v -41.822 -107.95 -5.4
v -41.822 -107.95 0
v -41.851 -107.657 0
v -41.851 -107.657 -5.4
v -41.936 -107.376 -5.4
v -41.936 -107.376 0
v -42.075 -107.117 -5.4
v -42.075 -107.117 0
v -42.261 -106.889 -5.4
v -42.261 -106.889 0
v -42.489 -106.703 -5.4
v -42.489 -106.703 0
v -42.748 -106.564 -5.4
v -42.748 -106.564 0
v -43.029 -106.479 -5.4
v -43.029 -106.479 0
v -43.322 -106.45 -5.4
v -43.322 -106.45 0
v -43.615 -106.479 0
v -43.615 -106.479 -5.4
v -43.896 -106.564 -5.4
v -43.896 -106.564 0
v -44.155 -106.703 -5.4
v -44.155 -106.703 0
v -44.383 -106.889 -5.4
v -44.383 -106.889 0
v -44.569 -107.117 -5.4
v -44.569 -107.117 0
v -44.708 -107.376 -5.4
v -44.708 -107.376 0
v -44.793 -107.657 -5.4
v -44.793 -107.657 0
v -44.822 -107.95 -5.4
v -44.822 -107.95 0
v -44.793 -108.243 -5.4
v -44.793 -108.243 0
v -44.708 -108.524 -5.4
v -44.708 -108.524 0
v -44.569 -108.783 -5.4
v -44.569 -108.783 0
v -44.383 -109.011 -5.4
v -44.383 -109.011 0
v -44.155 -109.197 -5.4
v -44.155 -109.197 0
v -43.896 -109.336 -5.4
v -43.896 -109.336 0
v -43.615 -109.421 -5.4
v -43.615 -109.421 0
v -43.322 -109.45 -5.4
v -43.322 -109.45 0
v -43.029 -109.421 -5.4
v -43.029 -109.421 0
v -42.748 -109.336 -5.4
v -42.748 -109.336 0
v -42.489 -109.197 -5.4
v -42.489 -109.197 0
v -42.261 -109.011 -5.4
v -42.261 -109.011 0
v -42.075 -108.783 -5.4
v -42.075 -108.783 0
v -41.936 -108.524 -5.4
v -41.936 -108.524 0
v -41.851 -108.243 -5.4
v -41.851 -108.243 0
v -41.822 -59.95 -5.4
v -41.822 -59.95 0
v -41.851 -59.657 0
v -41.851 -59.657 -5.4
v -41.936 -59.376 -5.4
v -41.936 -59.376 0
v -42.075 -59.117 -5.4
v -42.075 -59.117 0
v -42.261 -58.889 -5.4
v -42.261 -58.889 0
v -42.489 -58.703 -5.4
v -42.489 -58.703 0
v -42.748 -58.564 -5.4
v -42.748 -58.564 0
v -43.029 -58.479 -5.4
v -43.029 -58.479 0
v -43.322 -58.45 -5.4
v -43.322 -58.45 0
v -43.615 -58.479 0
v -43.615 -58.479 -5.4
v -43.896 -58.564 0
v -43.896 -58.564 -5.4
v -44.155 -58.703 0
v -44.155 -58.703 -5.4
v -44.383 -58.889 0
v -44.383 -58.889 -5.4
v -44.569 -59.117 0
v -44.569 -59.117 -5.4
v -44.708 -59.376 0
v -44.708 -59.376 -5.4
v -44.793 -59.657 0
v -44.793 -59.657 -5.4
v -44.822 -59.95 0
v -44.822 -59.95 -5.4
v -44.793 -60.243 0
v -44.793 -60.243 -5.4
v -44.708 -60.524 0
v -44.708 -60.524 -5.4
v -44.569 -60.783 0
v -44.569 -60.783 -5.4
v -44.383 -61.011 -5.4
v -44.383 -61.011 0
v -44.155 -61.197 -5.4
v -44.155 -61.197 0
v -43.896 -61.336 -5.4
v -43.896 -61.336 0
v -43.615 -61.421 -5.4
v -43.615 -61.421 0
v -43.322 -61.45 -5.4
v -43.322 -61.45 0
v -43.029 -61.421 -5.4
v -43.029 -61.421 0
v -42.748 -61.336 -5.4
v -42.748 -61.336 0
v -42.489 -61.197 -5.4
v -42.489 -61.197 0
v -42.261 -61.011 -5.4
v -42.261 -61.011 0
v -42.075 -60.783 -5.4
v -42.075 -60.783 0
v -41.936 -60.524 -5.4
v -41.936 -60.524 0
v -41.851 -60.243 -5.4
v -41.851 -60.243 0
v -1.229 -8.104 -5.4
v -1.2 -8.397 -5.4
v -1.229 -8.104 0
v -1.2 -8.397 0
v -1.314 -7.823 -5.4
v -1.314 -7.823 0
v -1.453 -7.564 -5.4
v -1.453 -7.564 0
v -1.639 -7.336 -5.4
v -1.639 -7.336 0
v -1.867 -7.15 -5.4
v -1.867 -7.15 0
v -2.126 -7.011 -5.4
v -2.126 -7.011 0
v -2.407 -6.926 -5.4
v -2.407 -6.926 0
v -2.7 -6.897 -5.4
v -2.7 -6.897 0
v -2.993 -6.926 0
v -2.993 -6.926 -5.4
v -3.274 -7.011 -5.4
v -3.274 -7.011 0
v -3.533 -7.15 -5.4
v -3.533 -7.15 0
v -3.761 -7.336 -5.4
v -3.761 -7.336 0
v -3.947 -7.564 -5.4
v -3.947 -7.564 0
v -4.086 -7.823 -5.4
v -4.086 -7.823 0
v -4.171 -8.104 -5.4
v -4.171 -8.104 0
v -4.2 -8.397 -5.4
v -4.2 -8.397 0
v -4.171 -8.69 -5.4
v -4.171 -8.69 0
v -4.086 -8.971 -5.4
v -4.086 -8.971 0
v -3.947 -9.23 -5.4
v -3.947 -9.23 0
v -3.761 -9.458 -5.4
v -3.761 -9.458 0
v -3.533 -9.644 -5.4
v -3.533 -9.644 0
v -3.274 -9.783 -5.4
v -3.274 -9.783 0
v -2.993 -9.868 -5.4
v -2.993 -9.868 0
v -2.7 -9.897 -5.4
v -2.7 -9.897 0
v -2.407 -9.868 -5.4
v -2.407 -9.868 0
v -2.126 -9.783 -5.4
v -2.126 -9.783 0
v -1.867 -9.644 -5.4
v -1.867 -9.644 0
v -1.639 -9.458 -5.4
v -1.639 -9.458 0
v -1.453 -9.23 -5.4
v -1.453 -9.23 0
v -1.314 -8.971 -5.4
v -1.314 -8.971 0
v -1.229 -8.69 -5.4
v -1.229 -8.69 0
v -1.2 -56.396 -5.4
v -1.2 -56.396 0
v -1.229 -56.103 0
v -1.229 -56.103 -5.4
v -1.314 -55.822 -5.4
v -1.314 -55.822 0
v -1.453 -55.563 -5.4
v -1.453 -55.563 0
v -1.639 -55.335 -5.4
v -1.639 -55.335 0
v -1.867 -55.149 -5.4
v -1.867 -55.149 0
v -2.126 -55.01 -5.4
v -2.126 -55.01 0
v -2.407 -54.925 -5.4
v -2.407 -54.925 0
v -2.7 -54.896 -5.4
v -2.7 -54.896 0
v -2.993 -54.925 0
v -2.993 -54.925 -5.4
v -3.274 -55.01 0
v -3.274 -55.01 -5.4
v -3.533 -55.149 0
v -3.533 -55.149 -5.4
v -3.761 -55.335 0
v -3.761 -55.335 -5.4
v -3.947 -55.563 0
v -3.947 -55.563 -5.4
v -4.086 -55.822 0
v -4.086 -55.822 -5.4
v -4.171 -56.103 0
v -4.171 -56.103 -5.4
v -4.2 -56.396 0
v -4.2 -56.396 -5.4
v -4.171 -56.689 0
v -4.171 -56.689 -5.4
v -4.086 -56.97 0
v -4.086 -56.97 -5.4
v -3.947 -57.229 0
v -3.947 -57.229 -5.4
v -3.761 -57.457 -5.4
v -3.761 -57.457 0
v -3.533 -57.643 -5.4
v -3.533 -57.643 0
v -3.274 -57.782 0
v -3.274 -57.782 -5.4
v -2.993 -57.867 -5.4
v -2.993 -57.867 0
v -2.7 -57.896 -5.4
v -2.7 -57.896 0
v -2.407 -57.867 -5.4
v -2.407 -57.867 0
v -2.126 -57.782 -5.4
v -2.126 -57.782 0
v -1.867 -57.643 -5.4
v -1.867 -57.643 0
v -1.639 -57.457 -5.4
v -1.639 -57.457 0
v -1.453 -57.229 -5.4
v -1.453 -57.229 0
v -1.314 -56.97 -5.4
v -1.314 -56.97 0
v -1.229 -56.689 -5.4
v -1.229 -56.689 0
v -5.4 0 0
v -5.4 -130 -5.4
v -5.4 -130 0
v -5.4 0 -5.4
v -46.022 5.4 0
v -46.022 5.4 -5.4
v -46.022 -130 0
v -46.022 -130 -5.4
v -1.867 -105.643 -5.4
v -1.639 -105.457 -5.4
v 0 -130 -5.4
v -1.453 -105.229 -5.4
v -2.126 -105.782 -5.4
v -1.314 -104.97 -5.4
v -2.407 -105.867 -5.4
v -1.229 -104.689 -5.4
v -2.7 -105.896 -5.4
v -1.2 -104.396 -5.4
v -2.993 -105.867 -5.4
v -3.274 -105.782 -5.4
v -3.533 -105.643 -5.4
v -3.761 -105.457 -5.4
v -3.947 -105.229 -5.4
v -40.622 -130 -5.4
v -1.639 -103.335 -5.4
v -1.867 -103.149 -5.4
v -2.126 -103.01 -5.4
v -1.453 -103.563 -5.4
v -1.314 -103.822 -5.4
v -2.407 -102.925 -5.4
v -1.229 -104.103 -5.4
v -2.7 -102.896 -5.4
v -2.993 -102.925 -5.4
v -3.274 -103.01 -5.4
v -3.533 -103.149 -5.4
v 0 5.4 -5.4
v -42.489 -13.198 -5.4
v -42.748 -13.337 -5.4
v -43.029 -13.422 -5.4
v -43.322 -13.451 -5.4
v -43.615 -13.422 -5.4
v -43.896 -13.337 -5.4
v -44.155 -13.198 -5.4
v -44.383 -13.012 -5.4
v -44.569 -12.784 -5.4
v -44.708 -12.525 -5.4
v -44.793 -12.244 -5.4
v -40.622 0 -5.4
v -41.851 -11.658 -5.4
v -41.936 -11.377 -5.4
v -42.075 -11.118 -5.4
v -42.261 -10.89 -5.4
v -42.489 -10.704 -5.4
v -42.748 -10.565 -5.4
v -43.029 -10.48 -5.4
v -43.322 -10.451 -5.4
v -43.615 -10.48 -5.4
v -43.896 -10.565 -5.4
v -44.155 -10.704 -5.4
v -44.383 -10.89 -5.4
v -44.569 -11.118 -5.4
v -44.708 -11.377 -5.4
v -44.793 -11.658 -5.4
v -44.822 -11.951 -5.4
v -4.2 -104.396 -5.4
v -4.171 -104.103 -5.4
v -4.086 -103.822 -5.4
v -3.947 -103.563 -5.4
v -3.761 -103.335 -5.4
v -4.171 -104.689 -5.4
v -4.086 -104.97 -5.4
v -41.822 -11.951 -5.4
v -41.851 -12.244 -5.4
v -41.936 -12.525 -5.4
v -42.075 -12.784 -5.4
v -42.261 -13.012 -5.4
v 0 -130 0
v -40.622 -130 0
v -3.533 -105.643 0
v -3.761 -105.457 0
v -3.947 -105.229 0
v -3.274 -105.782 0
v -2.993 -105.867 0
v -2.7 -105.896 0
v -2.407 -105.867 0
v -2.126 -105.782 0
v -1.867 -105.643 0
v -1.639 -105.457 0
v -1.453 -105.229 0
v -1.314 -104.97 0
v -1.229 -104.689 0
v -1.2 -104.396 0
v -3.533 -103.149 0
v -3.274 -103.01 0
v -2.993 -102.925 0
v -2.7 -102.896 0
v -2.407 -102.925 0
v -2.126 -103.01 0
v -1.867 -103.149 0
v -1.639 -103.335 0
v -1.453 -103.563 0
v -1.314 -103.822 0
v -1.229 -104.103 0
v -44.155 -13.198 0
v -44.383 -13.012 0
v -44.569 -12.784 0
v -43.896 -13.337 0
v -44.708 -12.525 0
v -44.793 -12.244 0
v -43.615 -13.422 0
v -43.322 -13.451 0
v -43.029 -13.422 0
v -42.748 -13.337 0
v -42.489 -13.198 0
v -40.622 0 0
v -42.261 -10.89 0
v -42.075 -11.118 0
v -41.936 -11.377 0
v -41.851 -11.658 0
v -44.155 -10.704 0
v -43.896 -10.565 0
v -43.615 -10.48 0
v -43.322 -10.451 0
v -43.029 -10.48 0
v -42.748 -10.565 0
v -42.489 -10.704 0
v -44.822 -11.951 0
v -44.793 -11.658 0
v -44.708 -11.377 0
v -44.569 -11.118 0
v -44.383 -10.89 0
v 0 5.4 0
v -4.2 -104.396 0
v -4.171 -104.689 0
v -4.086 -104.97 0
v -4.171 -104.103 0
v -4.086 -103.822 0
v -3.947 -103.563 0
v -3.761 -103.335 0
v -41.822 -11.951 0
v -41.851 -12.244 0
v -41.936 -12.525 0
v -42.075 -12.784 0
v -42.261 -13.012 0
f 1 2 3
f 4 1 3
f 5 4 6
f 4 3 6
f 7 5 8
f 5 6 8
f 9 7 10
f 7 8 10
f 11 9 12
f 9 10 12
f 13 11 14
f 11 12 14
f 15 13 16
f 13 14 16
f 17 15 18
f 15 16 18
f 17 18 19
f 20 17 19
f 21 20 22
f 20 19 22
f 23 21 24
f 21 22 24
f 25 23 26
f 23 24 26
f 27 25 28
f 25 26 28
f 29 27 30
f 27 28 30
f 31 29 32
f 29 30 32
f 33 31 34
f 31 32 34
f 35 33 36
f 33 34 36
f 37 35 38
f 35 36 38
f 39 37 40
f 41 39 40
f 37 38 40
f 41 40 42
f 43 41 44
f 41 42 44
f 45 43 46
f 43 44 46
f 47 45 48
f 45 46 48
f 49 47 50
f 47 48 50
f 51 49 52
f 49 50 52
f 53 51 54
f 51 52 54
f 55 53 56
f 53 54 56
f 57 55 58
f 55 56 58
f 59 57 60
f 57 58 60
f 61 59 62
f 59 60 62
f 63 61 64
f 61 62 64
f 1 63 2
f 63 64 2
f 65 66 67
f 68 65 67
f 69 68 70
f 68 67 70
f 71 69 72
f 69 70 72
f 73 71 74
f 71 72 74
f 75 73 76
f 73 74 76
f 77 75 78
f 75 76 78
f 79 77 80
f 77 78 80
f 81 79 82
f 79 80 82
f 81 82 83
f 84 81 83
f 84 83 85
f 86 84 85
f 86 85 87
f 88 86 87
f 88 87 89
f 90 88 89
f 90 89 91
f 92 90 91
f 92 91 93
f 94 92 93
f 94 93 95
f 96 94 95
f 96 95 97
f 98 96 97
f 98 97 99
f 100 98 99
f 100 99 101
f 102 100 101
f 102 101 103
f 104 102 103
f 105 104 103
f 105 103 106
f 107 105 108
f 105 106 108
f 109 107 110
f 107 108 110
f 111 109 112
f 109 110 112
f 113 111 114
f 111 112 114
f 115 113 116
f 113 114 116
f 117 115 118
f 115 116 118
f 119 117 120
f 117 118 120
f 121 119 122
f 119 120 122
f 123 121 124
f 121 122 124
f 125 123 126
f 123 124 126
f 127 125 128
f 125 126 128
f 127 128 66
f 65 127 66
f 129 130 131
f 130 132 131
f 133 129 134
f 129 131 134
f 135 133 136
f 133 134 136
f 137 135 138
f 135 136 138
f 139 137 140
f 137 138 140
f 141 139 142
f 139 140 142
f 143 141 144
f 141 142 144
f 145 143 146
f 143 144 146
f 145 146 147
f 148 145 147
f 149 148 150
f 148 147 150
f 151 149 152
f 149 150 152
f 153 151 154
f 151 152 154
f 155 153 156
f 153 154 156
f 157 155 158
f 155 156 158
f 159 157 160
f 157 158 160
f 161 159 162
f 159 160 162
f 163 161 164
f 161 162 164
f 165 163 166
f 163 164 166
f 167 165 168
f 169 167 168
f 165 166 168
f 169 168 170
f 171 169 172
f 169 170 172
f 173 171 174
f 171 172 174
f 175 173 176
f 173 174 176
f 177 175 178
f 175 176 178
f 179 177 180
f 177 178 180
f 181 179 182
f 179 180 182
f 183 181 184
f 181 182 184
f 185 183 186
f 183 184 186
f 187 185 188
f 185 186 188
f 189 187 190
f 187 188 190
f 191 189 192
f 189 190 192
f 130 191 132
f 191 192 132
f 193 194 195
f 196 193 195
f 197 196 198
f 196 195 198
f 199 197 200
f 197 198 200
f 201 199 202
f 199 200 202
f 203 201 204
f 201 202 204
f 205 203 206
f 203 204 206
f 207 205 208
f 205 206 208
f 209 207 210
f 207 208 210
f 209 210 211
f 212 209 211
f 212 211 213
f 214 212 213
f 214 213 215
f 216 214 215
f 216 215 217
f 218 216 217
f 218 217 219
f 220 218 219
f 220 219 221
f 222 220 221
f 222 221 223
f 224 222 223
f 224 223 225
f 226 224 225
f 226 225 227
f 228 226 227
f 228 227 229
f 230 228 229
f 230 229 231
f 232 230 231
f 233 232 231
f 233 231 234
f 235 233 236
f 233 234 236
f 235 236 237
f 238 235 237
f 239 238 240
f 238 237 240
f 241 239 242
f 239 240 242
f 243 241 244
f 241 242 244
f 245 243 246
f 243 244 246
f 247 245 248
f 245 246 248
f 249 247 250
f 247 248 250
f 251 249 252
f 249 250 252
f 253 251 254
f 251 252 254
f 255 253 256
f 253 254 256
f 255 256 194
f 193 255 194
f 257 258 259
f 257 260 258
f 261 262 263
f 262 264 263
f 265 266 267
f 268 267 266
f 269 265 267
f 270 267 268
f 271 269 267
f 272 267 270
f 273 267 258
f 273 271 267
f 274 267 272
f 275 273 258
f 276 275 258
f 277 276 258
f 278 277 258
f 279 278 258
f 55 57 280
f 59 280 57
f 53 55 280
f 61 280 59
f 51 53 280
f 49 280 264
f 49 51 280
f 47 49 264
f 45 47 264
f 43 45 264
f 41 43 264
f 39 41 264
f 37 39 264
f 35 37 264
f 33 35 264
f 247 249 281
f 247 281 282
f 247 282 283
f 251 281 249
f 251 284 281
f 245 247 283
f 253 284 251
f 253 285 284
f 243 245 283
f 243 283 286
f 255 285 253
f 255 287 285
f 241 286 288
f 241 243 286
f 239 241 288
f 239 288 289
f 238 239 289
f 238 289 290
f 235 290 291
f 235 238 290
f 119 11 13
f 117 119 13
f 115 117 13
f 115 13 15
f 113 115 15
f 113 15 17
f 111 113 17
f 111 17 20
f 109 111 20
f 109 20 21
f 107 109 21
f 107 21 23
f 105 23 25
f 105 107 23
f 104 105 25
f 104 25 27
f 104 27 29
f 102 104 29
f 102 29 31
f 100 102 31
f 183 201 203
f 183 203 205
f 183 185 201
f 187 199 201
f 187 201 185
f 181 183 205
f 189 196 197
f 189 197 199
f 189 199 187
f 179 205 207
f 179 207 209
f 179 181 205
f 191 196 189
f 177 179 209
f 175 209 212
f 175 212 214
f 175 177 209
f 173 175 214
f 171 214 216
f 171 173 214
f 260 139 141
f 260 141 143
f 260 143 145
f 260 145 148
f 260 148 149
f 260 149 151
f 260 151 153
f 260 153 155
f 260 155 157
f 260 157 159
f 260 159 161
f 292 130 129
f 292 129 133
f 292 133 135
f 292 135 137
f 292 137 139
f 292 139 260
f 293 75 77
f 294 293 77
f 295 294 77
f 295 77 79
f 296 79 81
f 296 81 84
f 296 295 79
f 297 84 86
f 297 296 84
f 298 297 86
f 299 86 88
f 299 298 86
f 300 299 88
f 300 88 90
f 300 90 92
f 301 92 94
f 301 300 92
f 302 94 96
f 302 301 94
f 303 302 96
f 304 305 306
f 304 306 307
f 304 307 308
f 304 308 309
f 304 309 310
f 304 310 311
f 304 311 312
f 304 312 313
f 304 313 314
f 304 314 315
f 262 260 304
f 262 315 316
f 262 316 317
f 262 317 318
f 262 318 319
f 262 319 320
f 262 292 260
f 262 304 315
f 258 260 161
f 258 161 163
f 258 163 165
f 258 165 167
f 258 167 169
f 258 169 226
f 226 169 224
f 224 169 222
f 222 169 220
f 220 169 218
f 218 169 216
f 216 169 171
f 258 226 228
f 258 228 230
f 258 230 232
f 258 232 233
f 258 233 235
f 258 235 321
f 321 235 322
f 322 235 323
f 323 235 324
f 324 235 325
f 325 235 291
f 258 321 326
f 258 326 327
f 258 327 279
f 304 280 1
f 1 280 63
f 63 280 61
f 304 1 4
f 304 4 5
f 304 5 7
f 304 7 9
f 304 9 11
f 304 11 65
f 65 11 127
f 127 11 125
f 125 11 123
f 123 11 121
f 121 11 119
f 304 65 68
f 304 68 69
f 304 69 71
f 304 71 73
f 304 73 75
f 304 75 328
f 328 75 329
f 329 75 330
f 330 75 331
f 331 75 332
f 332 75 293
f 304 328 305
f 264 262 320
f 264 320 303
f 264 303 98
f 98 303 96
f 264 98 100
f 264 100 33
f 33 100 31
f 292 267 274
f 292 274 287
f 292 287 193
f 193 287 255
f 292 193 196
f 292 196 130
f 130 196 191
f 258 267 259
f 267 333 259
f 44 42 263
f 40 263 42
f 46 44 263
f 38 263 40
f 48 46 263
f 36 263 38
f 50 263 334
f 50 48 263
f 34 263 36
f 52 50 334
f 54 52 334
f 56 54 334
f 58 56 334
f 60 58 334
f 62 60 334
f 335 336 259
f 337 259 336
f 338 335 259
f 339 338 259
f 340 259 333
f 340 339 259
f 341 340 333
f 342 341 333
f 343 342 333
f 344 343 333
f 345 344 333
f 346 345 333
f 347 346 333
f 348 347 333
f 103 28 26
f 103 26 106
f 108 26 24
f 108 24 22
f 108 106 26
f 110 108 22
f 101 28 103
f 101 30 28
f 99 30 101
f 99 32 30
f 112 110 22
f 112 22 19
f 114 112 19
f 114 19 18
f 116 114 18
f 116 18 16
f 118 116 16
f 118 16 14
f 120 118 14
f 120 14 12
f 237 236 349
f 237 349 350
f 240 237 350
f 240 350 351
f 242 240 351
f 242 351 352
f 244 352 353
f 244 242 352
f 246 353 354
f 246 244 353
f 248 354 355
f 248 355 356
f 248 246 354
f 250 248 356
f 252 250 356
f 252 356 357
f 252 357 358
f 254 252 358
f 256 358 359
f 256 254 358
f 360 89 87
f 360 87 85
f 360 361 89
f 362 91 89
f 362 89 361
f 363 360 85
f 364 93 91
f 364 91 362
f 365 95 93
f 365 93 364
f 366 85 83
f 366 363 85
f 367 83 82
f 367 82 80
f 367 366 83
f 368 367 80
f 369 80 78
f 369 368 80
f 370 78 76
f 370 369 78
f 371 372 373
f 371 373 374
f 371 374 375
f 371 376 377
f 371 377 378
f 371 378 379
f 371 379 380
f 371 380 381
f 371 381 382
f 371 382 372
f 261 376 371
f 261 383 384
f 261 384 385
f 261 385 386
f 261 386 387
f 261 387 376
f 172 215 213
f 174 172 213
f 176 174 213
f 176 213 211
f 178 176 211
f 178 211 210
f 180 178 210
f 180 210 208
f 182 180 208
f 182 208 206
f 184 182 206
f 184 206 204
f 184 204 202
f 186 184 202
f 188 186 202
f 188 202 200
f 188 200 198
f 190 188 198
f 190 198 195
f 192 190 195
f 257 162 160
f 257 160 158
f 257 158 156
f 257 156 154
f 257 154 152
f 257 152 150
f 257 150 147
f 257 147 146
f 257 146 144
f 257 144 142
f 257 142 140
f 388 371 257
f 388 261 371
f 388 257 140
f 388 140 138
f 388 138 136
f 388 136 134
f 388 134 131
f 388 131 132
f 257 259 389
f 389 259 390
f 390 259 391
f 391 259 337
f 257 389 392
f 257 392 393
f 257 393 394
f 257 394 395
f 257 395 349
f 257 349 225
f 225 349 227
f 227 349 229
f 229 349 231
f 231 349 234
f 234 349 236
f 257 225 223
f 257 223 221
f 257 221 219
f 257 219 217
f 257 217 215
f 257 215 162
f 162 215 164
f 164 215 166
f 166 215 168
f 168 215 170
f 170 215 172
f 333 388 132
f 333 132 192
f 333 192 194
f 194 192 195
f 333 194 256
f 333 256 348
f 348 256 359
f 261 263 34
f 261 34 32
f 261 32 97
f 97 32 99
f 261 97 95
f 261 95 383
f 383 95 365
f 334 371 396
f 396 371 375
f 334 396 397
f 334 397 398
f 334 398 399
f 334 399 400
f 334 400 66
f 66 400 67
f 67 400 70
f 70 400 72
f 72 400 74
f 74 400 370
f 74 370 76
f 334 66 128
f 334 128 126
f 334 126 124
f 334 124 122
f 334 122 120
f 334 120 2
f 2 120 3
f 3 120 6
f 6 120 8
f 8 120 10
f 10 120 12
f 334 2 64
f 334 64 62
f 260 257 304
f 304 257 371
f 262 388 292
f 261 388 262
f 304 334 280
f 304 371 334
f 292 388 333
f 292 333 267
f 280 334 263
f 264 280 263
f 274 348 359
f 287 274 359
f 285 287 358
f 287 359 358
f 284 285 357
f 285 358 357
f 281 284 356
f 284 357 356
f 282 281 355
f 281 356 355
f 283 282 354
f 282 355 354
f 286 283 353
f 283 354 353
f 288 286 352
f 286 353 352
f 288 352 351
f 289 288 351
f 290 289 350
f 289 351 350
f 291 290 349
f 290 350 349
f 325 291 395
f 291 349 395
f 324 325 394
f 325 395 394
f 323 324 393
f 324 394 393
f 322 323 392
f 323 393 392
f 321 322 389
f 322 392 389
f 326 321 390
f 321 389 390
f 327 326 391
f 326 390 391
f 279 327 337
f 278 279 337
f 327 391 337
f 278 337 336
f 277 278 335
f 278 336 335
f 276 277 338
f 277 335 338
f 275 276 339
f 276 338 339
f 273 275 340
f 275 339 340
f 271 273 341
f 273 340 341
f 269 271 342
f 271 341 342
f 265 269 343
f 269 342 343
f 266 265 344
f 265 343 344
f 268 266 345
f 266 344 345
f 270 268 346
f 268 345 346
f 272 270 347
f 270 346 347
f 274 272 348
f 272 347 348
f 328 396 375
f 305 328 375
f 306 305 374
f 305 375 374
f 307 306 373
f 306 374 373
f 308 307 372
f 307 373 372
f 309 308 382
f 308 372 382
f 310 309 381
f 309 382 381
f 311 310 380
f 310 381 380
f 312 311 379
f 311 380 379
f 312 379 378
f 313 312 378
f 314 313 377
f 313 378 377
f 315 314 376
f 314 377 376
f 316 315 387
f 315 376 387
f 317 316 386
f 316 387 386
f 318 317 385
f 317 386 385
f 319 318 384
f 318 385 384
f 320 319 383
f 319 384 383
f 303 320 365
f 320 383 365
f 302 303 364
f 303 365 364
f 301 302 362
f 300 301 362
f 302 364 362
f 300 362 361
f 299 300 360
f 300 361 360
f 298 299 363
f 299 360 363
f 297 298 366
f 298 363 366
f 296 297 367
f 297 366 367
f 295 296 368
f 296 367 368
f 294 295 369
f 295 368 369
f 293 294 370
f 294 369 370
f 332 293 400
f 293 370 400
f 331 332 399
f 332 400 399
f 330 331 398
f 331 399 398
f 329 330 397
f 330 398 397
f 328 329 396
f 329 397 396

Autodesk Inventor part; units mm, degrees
ref_plane "YZ Plane" through (0, 0, 0) normal (1, 0, 0) x (0, 1, 0)
ref_plane "XZ Plane" through (0, 0, 0) normal (0, 1, 0) x (-1, 0, 0)
ref_plane "XY Plane" through (0, 0, 0) normal (0, 0, 1) x (1, 0, 0)
sketch "Esboço1" plane through (0, 0, 0) normal (0, 1, 0) x (-1, 0, 0)
  line L0 (0, 0) -> (0, -5.4)
  line L1 (0, -5.4) -> (5.4, -5.4)
  line L2 (5.4, -5.4) -> (5.4, 0)
  line L3 (5.4, 0) -> (0, 0)
  line L4 (40.622, 0) -> (40.622, -5.4)
  line L5 (40.622, -5.4) -> (46.022, -5.4)
  line L6 (46.022, -5.4) -> (46.022, 0)
  line L7 (46.022, 0) -> (40.622, 0)
  line L8 (40.622, 0) -> (5.4, 0)
  line L9 (5.4, -5.4) -> (40.622, -5.4)
  point P0 (0, -2.7)
  point P1 (5.4, -2.7)
  point P2 (40.622, -2.7)
  point P3 (46.022, -2.7)
  point P4 (43.322, -5.4)
  point P5 (2.7, -5.4)
  point P6 (43.322, 0)
  point P7 (2.7, 0)
  point P8 (0, 0)
  dimension "d29" = 35.222
  dimension "d30" = 5.4
extrude "Extrusão1" add sketch "Esboço1" against normal blind 130 contours L3 L2 L1 L0 | L7 L6 L5 L4
extrude "Extrusão4" add sketch "Esboço1" along normal blind 5.4
sketch "Esboço5" plane through (-40.622, 0, 0) normal (0, 0, 1) x (1, 0, 0)
  circle A0 centre (37.922, -104.396) radius 1.5
  circle A1 centre (37.922, -56.396) radius 1.5
  circle A2 centre (37.922, -8.397) radius 1.5
  circle A3 centre (-2.7, -107.95) radius 1.5
  circle A4 centre (-2.7, -59.95) radius 1.5
  circle A5 centre (-2.7, -11.951) radius 1.5
  line L0 (40.622, -130) -> (35.222, -130) projected
  line L1 (0, -130) -> (-5.4, -130) projected
  line L2 (37.7913, -105.8903) -> (103.7232, -105.8903) construction
  line L3 (38.0527, -57.8903) -> (-2.5693, -61.4443)
  line L4 (38.0527, -9.8913) -> (-2.5693, -13.4453)
  line L5 (-2.5693, -109.4443) -> (38.0527, -105.8903)
  point P0 (40.622, 0)
  point P1 (37.922, -130)
  point P2 (-2.7, -130)
  dimension "d33" = 3
  dimension "d34" = 3
  dimension "d36" = 3
  dimension "d38" = 3
  dimension "d40" = 3
  dimension "d42" = 3
  dimension "d44" = 25.604
  dimension "d45" = 48
  dimension "d46" = 47.999
  dimension "d52" = 5
extrude "Extrusão5" cut sketch "Esboço5" against normal through all
equation "\"d29\" = Largura_trilhos"
equation "\"d33\" = Parafuso"
equation "\"d34\" = d35"
equation "\"d36\" = d37"
equation "\"d38\" = d39"
equation "\"d40\" = d41"
equation "\"d42\" = d43"
equation "\"Largura_trilhos\" = 35.222"
equation "\"Parafuso\" = 3"
equation "\"d11\" = 3"
equation "\"d13\" = 3"
equation "\"d15\" = 3"
equation "\"d17\" = 3"
equation "\"d19\" = 3"
equation "\"d35\" = 3"
equation "\"d37\" = 3"
equation "\"d39\" = 3"
equation "\"d41\" = 3"
equation "\"d43\" = 3"
properties part number "Sustentação Trilhos fixos" material "Plástico PET"
